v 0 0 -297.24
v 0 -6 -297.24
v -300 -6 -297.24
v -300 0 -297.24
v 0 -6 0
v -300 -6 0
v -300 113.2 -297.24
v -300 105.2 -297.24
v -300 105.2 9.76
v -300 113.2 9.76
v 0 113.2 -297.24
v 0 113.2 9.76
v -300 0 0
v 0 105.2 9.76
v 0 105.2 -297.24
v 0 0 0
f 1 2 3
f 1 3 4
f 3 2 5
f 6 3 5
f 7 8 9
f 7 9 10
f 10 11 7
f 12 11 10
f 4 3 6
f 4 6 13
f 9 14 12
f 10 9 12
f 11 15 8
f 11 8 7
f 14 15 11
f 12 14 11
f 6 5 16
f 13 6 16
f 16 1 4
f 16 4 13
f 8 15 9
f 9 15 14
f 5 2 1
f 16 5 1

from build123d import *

# Parameters (mm, degrees)
F0_W     = 8
F0_H     = 307
F0_W_2   = 6
F0_H_2   = 297.24
F1_DEPTH = 300


with BuildPart() as f1:
    # F0 (on Right) → F1 (new body)
    with BuildSketch(Plane.YZ):
        with Locations((109.2, -143.74)):
            Rectangle(F0_W, F0_H)
        with Locations((-3, -148.62)):
            Rectangle(F0_W_2, F0_H_2)
    extrude(amount=-F1_DEPTH)


solid = f1.part
